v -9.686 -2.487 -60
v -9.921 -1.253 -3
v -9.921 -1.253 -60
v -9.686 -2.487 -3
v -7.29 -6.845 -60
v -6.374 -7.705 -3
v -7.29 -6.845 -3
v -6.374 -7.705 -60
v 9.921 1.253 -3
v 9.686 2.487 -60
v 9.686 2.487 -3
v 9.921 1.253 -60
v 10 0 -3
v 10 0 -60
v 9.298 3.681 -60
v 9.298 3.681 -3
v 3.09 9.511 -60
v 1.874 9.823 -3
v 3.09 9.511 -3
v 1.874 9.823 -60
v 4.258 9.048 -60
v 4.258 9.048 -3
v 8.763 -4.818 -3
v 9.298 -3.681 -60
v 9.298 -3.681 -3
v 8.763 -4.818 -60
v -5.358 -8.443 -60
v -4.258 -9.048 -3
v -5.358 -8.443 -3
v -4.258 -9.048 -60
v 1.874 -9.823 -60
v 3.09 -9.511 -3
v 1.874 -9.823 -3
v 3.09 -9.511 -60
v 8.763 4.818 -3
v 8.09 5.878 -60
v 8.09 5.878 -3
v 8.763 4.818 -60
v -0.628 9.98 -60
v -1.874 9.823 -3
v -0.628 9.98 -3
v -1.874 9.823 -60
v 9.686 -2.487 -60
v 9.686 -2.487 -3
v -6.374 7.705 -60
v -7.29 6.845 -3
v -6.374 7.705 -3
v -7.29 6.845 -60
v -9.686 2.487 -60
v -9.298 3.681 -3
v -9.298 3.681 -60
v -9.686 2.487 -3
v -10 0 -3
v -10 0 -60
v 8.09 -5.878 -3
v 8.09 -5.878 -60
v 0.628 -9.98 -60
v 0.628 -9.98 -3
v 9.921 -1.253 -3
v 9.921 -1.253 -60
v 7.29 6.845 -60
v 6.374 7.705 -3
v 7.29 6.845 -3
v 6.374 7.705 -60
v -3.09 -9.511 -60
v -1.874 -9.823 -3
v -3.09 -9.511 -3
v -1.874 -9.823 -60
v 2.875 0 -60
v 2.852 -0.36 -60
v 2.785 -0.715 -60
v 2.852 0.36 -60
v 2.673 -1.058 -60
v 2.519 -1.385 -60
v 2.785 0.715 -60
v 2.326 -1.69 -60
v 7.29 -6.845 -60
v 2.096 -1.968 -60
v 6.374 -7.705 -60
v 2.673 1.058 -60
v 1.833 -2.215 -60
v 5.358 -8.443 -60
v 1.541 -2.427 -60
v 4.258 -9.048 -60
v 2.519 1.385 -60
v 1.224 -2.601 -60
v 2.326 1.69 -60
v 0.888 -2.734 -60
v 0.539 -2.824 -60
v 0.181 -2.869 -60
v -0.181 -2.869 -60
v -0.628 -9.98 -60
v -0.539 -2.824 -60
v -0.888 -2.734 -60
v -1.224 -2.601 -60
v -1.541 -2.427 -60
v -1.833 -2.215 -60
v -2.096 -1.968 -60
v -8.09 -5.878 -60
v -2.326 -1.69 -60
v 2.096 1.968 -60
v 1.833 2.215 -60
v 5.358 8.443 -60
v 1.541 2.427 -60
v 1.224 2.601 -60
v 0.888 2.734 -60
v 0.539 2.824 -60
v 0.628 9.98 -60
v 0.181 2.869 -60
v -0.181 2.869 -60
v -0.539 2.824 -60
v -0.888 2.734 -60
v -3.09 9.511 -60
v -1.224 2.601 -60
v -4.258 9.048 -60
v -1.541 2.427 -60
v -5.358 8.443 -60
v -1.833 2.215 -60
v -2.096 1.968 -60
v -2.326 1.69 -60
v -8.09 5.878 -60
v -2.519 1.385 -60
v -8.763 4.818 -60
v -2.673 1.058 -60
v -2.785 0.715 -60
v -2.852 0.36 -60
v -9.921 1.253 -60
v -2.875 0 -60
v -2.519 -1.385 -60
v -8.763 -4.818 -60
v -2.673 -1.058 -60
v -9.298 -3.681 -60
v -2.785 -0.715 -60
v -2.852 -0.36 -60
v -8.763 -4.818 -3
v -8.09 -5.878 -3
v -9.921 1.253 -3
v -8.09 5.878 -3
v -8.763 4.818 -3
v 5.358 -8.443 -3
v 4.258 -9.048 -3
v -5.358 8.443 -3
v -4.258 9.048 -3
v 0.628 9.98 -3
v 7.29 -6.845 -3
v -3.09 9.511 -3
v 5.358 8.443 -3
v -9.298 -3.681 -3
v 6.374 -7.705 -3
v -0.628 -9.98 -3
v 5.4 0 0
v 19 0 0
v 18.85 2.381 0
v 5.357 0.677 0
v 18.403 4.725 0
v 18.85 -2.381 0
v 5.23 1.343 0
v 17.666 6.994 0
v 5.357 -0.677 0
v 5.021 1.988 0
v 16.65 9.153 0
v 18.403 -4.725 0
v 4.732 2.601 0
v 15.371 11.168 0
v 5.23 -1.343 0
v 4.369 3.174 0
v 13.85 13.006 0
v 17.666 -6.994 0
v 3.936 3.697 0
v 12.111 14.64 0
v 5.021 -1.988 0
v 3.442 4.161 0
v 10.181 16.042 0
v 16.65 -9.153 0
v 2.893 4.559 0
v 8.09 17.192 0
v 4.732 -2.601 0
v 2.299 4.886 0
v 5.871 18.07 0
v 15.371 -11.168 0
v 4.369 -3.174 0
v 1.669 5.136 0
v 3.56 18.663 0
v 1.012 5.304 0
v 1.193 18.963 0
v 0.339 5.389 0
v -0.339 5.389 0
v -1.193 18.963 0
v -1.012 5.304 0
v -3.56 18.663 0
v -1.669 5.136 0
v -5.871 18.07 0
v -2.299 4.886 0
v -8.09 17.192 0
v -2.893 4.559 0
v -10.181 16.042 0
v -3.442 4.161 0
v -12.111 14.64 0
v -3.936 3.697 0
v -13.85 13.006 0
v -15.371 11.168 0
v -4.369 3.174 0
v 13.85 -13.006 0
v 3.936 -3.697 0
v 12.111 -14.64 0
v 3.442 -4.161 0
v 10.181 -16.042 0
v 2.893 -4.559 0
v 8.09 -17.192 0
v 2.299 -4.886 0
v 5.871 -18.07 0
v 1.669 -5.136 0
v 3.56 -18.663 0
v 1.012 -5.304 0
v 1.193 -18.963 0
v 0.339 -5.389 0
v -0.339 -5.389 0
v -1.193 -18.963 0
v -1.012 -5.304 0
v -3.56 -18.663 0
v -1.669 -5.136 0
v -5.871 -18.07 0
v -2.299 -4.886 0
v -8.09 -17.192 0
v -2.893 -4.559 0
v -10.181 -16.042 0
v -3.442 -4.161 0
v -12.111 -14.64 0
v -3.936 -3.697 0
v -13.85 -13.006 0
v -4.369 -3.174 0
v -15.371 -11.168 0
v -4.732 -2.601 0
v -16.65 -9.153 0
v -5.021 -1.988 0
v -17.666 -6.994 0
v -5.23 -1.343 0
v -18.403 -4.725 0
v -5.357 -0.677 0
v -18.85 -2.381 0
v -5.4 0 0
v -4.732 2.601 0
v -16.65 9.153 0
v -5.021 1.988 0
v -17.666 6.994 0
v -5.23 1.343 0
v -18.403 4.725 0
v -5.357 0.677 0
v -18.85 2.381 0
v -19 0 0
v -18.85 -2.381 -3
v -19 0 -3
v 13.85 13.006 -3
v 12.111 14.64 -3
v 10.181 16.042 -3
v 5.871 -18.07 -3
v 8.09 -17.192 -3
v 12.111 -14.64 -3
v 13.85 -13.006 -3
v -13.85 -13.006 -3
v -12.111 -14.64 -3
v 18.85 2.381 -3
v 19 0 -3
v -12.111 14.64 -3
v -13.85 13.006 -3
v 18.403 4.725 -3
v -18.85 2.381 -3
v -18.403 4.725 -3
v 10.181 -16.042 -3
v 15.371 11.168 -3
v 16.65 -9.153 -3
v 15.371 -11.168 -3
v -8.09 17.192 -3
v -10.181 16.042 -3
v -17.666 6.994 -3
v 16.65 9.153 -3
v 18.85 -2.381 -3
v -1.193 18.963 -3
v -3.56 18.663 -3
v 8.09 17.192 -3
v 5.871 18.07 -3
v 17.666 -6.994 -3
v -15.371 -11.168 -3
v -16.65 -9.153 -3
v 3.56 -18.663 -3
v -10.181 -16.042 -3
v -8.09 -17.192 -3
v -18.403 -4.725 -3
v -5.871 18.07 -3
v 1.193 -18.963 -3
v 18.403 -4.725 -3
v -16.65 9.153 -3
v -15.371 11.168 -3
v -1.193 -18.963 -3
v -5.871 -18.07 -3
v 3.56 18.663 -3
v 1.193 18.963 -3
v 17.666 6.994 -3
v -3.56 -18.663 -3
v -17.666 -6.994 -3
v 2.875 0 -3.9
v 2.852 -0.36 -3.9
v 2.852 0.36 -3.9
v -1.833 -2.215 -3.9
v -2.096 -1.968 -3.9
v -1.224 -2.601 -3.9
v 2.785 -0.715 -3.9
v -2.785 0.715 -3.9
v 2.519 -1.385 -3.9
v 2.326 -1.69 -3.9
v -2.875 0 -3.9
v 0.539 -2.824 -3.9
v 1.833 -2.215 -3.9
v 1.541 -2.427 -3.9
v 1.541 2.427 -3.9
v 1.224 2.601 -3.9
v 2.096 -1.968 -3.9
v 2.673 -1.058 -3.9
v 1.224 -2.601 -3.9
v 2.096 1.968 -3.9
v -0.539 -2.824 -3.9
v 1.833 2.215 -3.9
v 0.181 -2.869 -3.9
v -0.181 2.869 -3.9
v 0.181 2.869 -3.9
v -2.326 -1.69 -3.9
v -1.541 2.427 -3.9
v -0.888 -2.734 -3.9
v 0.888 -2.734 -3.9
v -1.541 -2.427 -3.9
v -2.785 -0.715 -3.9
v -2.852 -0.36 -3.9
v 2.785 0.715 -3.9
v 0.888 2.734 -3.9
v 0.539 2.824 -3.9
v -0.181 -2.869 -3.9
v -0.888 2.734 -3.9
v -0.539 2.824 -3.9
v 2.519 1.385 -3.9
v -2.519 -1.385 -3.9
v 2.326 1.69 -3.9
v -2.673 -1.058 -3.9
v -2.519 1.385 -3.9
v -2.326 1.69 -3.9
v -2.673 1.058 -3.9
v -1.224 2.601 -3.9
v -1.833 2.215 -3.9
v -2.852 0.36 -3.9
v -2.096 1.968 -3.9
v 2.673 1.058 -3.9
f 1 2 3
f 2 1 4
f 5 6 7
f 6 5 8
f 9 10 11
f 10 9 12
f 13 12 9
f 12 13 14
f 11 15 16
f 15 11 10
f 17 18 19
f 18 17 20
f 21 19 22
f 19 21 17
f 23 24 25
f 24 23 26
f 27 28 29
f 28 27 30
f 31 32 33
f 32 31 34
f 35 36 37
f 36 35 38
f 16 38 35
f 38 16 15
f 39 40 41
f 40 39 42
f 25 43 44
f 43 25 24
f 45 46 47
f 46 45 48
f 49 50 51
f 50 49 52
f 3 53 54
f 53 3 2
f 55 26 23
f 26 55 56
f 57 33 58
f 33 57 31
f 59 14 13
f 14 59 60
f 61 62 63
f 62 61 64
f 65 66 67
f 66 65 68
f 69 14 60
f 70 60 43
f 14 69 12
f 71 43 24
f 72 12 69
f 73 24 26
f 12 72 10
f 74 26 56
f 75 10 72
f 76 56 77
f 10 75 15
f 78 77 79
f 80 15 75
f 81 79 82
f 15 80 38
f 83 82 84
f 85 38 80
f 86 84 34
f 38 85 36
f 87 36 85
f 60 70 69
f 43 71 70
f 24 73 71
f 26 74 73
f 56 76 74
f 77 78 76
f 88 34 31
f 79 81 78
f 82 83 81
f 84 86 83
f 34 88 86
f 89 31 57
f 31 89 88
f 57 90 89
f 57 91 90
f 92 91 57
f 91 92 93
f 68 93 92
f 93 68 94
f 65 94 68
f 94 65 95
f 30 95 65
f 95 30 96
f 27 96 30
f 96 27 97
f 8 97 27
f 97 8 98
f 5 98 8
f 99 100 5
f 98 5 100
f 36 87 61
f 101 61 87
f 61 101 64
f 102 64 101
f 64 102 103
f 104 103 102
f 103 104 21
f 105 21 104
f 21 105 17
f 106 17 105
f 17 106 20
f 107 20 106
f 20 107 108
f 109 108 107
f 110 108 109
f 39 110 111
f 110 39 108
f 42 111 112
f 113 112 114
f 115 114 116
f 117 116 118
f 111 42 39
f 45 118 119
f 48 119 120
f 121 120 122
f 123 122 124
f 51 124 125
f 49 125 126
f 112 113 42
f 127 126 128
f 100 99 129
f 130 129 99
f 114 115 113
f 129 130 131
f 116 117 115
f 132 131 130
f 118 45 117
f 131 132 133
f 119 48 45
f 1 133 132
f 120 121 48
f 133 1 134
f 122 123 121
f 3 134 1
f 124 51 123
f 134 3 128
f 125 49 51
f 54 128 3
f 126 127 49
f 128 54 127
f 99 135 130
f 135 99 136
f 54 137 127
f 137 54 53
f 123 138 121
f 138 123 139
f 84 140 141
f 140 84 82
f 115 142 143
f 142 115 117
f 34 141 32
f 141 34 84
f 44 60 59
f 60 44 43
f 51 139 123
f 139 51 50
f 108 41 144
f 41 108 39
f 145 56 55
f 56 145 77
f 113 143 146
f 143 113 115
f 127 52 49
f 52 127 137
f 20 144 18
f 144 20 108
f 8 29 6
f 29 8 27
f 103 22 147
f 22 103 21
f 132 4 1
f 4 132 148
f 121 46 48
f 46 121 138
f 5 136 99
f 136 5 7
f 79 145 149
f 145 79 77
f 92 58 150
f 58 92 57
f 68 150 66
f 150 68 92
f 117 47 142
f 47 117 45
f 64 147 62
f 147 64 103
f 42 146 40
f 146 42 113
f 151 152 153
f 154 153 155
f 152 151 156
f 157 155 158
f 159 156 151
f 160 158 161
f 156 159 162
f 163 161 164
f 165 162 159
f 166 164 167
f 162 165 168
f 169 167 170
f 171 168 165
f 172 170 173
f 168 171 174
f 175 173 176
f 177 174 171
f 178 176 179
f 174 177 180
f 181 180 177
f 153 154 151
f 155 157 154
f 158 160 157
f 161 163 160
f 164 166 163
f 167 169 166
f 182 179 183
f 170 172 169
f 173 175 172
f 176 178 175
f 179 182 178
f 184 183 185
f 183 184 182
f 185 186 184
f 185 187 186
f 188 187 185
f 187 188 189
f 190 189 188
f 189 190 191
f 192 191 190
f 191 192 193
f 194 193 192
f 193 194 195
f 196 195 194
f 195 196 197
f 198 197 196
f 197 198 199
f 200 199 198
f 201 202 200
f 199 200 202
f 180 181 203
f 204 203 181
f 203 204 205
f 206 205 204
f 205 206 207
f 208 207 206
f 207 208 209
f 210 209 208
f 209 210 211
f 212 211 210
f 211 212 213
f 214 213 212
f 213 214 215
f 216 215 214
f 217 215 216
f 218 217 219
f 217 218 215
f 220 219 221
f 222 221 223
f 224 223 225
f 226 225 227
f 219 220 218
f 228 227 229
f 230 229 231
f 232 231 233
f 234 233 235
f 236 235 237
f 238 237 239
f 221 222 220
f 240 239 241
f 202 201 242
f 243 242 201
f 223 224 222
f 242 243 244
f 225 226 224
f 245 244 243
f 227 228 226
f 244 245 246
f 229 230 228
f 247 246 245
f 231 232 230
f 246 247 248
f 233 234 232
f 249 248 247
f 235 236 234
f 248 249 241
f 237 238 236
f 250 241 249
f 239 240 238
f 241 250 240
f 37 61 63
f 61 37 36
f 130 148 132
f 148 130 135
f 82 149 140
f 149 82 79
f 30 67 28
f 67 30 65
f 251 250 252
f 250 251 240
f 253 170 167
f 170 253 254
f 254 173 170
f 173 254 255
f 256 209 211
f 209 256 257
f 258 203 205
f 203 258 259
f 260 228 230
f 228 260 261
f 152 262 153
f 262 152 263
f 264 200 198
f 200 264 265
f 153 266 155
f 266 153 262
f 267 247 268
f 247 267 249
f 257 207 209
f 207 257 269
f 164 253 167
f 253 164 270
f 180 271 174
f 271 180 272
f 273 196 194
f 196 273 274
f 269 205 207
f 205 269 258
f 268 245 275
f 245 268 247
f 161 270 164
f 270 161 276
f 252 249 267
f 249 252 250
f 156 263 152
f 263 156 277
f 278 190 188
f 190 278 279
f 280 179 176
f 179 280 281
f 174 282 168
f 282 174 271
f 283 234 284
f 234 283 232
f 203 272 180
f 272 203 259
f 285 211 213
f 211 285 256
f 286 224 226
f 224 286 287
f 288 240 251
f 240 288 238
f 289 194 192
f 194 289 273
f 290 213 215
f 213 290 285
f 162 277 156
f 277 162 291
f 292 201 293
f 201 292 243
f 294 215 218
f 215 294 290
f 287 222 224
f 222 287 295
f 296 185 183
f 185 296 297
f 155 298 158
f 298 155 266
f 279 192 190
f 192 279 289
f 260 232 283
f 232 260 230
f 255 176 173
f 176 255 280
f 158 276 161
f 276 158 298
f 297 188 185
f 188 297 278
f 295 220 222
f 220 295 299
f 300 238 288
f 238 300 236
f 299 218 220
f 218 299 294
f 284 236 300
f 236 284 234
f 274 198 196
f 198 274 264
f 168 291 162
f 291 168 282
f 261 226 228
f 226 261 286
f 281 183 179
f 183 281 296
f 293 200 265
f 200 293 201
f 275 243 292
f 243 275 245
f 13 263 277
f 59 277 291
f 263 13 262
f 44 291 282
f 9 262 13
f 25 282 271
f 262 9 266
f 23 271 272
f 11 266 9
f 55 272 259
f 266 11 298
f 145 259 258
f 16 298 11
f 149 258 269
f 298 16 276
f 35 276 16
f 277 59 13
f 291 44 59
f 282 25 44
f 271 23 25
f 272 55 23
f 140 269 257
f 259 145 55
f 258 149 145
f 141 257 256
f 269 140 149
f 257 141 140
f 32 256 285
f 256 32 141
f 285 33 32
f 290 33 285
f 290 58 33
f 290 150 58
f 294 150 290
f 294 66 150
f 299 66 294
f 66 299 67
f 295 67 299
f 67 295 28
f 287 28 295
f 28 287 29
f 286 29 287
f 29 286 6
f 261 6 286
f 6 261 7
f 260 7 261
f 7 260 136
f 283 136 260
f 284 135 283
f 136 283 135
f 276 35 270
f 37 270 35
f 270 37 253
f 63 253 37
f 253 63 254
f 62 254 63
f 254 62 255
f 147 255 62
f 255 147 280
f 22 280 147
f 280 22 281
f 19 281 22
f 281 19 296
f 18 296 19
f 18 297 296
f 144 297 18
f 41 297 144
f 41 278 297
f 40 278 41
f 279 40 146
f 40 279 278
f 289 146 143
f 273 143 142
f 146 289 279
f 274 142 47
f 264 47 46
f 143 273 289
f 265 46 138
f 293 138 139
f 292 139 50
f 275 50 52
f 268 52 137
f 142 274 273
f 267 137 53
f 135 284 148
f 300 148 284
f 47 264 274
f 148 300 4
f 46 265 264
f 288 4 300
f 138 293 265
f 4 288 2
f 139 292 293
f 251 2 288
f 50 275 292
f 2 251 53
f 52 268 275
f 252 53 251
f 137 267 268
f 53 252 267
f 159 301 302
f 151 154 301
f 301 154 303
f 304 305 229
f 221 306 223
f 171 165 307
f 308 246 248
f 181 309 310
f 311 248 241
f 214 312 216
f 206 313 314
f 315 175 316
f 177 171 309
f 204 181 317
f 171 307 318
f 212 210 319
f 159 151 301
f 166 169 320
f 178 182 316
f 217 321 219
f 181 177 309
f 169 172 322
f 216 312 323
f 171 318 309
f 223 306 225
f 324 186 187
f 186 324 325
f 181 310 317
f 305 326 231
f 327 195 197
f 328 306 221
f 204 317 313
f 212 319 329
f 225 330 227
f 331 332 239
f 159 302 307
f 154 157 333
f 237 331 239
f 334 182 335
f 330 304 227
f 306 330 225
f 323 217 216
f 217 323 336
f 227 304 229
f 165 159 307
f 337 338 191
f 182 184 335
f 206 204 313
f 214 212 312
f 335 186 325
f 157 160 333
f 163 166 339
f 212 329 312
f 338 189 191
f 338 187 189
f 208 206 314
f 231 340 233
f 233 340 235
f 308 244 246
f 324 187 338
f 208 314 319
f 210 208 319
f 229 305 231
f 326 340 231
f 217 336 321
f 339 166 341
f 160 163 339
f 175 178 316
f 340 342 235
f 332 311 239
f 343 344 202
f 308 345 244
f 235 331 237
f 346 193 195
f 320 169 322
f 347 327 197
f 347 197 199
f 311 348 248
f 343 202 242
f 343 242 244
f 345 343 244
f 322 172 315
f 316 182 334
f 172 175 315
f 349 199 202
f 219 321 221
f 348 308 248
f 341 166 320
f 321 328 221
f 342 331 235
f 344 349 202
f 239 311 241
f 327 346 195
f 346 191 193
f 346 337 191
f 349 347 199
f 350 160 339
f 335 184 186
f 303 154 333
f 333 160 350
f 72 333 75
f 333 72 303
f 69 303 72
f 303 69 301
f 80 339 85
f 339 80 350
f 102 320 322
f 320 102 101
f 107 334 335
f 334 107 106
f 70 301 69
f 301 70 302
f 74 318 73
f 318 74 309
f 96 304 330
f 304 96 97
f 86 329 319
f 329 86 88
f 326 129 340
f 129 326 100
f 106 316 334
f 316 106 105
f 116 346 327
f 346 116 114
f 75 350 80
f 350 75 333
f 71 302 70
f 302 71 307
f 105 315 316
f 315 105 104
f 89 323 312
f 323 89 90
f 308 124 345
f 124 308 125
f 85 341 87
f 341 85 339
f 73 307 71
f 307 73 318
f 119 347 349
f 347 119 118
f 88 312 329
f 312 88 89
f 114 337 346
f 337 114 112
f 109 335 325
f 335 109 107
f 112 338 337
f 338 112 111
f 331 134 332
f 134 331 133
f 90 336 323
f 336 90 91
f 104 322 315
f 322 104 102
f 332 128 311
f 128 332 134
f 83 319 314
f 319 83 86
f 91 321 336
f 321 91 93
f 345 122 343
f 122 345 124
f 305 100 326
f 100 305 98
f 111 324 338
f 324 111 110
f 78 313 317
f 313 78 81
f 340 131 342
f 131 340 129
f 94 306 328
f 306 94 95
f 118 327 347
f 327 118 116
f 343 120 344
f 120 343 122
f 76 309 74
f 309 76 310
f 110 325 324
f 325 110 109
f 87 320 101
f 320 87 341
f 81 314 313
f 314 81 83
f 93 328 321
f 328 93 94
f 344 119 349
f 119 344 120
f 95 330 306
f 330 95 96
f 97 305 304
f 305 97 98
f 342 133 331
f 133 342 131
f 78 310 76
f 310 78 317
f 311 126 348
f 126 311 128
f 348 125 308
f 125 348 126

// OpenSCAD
$fn = 50;


difference() {
	union() {
		translate(v = [0, 0, -60.0000000000]) {
			cylinder(h = 60, r = 10.0000000000);
		}
		translate(v = [0, 0, -3.0000000000]) {
			cylinder(h = 3, r = 19.0000000000);
		}
	}
	union() {
		translate(v = [0, 0, 0]) {
			rotate(a = [0, 0, 0]) {
				difference() {
					union() {
						#translate(v = [0, 0, -60.0000000000]) {
							cylinder(h = 60, r = 2.6000000000);
						}
						#translate(v = [0, 0, -3.9000000000]) {
							cylinder(h = 3.9000000000, r1 = 2.8750000000, r2 = 5.4000000000);
						}
						#translate(v = [0, 0, -60.0000000000]) {
							cylinder(h = 60, r = 2.8750000000);
						}
						#translate(v = [0, 0, -60.0000000000]) {
							cylinder(h = 60, r = 2.6000000000);
						}
					}
					union();
				}
			}
		}
	}
}
